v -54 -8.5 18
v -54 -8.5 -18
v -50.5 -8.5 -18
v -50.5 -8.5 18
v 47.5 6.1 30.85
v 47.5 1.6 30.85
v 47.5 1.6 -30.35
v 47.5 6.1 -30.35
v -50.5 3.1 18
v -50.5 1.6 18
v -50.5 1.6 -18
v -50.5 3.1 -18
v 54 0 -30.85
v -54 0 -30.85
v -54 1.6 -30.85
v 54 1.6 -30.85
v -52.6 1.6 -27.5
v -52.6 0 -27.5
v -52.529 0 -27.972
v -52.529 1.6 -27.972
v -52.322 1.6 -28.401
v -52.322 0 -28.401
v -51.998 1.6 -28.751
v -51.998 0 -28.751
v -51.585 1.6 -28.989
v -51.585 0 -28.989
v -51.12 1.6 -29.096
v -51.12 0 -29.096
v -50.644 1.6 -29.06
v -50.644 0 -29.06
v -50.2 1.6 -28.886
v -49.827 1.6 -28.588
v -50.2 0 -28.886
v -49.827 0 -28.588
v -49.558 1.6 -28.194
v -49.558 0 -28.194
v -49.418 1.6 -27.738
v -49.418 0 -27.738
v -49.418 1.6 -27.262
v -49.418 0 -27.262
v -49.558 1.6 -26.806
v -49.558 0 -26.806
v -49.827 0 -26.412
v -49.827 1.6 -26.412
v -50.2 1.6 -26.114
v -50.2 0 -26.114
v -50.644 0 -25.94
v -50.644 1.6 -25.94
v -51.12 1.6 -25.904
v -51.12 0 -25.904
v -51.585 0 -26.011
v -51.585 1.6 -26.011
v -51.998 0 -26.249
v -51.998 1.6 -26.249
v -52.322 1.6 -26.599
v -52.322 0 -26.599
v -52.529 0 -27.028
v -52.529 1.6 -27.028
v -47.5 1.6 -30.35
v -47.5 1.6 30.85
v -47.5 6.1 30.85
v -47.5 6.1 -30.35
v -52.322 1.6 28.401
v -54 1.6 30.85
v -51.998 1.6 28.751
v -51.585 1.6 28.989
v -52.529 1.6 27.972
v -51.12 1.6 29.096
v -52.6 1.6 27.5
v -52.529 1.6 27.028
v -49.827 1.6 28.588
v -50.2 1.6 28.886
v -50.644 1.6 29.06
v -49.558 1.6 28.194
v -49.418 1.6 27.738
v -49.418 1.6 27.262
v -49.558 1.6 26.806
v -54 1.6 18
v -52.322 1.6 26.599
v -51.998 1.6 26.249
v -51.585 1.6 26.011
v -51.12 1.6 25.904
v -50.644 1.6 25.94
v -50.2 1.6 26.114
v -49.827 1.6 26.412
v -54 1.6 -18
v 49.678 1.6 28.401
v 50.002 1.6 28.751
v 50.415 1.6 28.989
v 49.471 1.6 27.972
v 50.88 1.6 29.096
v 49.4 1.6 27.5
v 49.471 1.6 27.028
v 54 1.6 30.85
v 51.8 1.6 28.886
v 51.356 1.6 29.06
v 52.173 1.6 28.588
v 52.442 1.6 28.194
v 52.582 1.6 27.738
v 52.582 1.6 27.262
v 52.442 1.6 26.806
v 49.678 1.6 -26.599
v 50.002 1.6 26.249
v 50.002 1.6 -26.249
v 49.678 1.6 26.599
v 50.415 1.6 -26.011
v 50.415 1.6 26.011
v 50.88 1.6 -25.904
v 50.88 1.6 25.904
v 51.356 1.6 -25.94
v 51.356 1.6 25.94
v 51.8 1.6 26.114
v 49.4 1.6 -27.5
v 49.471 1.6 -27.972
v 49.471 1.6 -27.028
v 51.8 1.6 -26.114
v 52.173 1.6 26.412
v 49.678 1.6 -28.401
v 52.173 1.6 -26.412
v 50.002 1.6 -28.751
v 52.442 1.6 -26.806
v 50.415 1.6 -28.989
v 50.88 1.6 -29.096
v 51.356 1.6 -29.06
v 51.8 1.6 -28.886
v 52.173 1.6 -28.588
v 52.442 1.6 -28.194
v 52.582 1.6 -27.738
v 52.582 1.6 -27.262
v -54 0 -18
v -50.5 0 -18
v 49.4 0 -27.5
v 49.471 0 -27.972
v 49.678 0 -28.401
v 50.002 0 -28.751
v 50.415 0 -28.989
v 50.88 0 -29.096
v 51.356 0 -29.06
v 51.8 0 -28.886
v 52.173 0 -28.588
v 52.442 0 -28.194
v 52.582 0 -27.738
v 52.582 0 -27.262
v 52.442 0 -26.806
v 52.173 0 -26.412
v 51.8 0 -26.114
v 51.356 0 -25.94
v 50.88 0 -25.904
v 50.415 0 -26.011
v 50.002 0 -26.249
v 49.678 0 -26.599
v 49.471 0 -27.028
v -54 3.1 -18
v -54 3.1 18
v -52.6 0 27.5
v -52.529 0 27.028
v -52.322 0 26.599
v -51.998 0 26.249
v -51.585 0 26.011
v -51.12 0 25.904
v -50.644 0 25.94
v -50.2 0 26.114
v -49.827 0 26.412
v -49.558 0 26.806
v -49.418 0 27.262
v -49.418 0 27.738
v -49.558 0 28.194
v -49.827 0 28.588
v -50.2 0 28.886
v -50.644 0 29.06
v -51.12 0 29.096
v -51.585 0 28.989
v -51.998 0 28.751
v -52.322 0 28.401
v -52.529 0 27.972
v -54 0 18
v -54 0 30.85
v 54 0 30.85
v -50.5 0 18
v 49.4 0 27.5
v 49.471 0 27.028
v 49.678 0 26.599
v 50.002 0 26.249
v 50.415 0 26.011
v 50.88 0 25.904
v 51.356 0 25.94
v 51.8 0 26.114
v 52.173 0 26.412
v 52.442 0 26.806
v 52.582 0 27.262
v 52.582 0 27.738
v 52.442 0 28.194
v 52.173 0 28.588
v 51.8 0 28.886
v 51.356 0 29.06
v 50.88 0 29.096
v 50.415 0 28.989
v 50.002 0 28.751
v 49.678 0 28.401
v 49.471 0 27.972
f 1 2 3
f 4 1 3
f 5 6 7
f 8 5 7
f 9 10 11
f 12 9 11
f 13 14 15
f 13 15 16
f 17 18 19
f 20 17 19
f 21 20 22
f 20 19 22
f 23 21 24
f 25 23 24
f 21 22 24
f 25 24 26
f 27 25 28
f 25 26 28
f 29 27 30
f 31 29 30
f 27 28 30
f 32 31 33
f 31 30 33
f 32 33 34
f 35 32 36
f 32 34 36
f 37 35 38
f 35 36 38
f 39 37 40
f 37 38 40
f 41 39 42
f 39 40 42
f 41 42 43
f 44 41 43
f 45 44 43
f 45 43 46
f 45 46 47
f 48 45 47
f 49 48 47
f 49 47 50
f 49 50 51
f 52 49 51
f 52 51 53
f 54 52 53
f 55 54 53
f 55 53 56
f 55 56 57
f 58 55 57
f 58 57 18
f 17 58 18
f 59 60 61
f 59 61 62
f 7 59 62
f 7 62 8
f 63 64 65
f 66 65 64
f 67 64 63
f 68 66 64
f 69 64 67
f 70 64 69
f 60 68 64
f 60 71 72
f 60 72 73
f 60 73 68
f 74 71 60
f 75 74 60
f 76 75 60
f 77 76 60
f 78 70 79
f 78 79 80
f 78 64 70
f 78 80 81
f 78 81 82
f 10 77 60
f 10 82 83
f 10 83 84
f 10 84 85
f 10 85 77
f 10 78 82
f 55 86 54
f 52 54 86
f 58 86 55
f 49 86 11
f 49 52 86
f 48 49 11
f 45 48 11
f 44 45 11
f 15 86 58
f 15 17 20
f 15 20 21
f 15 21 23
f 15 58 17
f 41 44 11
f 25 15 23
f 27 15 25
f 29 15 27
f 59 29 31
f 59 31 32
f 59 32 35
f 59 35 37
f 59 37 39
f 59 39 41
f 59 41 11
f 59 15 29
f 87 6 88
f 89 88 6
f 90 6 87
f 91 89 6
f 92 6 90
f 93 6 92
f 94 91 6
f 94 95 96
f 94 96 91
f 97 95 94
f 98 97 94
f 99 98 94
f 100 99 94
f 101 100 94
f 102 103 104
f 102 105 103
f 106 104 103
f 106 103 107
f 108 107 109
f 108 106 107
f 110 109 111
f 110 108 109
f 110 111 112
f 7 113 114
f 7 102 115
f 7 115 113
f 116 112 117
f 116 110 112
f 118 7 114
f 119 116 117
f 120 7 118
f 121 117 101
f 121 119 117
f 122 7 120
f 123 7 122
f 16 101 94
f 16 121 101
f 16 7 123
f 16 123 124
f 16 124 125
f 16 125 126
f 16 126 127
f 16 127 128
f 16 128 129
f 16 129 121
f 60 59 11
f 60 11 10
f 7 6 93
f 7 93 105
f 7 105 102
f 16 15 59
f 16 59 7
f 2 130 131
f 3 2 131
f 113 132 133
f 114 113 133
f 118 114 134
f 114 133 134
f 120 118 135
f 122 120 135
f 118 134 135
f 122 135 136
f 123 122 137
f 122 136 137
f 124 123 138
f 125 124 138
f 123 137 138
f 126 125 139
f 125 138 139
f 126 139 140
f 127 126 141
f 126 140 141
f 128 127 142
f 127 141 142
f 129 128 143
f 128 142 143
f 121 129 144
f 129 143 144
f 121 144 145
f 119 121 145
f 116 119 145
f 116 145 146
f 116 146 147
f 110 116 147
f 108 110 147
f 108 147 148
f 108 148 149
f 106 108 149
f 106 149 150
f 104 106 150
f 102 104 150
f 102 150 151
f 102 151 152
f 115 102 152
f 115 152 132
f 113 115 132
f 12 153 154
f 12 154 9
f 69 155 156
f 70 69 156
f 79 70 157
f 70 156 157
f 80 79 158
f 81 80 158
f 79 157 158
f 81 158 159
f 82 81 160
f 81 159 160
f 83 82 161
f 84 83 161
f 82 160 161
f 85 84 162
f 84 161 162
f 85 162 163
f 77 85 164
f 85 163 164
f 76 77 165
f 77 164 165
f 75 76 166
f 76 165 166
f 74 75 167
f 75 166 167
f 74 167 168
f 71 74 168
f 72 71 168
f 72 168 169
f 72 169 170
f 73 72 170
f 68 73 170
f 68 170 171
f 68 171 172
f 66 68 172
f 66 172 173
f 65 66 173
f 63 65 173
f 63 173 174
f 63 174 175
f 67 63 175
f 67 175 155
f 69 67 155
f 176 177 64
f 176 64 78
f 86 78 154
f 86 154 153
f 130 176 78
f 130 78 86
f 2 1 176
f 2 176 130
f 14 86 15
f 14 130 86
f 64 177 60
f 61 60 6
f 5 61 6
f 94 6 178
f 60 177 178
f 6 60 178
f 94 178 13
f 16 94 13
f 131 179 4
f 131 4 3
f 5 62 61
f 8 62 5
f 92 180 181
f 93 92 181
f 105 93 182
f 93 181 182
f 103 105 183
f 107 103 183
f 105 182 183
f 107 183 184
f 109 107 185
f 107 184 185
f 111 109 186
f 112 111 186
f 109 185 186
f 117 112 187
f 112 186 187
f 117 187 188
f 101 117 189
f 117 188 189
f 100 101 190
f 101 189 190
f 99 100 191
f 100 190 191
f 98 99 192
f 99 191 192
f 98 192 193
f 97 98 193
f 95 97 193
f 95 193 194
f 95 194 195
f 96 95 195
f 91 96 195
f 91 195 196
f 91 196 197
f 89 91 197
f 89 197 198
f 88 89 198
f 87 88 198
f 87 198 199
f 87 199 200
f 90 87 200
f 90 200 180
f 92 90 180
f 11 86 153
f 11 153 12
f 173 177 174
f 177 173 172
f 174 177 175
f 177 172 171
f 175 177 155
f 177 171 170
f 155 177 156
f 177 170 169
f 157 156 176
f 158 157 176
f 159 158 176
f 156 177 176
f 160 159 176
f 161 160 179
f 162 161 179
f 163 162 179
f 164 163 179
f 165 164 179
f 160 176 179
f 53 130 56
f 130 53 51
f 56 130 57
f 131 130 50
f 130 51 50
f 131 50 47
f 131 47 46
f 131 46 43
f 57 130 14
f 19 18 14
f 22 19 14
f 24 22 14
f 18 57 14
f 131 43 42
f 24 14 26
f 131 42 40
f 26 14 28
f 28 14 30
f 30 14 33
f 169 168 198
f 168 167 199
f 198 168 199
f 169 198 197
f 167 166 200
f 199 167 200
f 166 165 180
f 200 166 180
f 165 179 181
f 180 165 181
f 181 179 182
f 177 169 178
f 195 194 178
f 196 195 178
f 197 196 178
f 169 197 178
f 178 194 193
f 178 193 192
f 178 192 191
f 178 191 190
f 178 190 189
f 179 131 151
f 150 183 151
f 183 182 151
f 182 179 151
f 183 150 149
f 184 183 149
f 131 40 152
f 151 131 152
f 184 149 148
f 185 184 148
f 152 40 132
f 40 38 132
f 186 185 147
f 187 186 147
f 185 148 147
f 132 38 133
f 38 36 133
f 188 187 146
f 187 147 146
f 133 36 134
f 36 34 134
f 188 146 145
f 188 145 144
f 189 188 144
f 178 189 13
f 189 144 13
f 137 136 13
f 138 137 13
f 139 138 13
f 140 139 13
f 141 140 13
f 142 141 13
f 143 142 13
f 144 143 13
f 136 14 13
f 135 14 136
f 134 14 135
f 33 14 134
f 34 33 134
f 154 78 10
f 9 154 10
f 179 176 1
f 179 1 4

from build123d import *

# Parameters (mm, degrees)
SKETCH_1_W         = 108
SKETCH_1_H         = 61.7
PCB_DEPTH          = 1.6
SKETCH_2_W         = 95
SKETCH_2_H         = 61.2
EXTRUDE_560_DEPTH  = 4.5
SKETCH_4_W         = 3.5
SKETCH_4_H         = 36
EXTRUDE_3_DEPTH    = 1.5
EXTRUDE_START      = -1.6
SKETCH_4_2_W       = 3.5
SKETCH_4_2_H       = 36
EXTRUDE_4_DEPTH    = 8.5
HOLE_WIZARD_M3_1_D = 3.2


with BuildPart() as part:
    # 草图1 → PCB (new body)
    with BuildSketch(Plane(origin=(0, 0, 0), x_dir=(1, 0, 0), z_dir=(0, 1, 0))):
        Rectangle(SKETCH_1_W, SKETCH_1_H)
    extrude(amount=PCB_DEPTH)

    # 草图2 → Extrude 560 (add)
    with BuildSketch(Plane(origin=(0, 1.6, 0), x_dir=(1, 0, 0), z_dir=(0, 1, 0))):
        with Locations((0, -0.25)):
            Rectangle(SKETCH_2_W, SKETCH_2_H)
    extrude(amount=EXTRUDE_560_DEPTH)

    # 草图4 → 凸台-拉伸3 (add)
    with BuildSketch(Plane(origin=(0, 1.6, 0), x_dir=(1, 0, 0), z_dir=(0, 1, 0))):
        with Locations((-52.25, 0)):
            Rectangle(SKETCH_4_W, SKETCH_4_H)
    extrude(amount=EXTRUDE_3_DEPTH)

    # 草图4<2> → 凸台-拉伸4 (add)
    with BuildSketch(Plane(origin=(0, 1.6, 0), x_dir=(1, 0, 0), z_dir=(0, 1, 0)).offset(EXTRUDE_START)):
        with Locations((-52.25, 0)):
            Rectangle(SKETCH_4_2_W, SKETCH_4_2_H)
    extrude(amount=-EXTRUDE_4_DEPTH)

    # M3 间隙孔1 (through all)
    with Locations(Plane(origin=(0, 1.6, 0), x_dir=(1, 0, 0), z_dir=(0, 1, 0))):
        with Locations((-51, 27.5), (-51, -27.5), (51, 27.5), (51, -27.5)):
            Hole(HOLE_WIZARD_M3_1_D / 2)


solid = part.part
